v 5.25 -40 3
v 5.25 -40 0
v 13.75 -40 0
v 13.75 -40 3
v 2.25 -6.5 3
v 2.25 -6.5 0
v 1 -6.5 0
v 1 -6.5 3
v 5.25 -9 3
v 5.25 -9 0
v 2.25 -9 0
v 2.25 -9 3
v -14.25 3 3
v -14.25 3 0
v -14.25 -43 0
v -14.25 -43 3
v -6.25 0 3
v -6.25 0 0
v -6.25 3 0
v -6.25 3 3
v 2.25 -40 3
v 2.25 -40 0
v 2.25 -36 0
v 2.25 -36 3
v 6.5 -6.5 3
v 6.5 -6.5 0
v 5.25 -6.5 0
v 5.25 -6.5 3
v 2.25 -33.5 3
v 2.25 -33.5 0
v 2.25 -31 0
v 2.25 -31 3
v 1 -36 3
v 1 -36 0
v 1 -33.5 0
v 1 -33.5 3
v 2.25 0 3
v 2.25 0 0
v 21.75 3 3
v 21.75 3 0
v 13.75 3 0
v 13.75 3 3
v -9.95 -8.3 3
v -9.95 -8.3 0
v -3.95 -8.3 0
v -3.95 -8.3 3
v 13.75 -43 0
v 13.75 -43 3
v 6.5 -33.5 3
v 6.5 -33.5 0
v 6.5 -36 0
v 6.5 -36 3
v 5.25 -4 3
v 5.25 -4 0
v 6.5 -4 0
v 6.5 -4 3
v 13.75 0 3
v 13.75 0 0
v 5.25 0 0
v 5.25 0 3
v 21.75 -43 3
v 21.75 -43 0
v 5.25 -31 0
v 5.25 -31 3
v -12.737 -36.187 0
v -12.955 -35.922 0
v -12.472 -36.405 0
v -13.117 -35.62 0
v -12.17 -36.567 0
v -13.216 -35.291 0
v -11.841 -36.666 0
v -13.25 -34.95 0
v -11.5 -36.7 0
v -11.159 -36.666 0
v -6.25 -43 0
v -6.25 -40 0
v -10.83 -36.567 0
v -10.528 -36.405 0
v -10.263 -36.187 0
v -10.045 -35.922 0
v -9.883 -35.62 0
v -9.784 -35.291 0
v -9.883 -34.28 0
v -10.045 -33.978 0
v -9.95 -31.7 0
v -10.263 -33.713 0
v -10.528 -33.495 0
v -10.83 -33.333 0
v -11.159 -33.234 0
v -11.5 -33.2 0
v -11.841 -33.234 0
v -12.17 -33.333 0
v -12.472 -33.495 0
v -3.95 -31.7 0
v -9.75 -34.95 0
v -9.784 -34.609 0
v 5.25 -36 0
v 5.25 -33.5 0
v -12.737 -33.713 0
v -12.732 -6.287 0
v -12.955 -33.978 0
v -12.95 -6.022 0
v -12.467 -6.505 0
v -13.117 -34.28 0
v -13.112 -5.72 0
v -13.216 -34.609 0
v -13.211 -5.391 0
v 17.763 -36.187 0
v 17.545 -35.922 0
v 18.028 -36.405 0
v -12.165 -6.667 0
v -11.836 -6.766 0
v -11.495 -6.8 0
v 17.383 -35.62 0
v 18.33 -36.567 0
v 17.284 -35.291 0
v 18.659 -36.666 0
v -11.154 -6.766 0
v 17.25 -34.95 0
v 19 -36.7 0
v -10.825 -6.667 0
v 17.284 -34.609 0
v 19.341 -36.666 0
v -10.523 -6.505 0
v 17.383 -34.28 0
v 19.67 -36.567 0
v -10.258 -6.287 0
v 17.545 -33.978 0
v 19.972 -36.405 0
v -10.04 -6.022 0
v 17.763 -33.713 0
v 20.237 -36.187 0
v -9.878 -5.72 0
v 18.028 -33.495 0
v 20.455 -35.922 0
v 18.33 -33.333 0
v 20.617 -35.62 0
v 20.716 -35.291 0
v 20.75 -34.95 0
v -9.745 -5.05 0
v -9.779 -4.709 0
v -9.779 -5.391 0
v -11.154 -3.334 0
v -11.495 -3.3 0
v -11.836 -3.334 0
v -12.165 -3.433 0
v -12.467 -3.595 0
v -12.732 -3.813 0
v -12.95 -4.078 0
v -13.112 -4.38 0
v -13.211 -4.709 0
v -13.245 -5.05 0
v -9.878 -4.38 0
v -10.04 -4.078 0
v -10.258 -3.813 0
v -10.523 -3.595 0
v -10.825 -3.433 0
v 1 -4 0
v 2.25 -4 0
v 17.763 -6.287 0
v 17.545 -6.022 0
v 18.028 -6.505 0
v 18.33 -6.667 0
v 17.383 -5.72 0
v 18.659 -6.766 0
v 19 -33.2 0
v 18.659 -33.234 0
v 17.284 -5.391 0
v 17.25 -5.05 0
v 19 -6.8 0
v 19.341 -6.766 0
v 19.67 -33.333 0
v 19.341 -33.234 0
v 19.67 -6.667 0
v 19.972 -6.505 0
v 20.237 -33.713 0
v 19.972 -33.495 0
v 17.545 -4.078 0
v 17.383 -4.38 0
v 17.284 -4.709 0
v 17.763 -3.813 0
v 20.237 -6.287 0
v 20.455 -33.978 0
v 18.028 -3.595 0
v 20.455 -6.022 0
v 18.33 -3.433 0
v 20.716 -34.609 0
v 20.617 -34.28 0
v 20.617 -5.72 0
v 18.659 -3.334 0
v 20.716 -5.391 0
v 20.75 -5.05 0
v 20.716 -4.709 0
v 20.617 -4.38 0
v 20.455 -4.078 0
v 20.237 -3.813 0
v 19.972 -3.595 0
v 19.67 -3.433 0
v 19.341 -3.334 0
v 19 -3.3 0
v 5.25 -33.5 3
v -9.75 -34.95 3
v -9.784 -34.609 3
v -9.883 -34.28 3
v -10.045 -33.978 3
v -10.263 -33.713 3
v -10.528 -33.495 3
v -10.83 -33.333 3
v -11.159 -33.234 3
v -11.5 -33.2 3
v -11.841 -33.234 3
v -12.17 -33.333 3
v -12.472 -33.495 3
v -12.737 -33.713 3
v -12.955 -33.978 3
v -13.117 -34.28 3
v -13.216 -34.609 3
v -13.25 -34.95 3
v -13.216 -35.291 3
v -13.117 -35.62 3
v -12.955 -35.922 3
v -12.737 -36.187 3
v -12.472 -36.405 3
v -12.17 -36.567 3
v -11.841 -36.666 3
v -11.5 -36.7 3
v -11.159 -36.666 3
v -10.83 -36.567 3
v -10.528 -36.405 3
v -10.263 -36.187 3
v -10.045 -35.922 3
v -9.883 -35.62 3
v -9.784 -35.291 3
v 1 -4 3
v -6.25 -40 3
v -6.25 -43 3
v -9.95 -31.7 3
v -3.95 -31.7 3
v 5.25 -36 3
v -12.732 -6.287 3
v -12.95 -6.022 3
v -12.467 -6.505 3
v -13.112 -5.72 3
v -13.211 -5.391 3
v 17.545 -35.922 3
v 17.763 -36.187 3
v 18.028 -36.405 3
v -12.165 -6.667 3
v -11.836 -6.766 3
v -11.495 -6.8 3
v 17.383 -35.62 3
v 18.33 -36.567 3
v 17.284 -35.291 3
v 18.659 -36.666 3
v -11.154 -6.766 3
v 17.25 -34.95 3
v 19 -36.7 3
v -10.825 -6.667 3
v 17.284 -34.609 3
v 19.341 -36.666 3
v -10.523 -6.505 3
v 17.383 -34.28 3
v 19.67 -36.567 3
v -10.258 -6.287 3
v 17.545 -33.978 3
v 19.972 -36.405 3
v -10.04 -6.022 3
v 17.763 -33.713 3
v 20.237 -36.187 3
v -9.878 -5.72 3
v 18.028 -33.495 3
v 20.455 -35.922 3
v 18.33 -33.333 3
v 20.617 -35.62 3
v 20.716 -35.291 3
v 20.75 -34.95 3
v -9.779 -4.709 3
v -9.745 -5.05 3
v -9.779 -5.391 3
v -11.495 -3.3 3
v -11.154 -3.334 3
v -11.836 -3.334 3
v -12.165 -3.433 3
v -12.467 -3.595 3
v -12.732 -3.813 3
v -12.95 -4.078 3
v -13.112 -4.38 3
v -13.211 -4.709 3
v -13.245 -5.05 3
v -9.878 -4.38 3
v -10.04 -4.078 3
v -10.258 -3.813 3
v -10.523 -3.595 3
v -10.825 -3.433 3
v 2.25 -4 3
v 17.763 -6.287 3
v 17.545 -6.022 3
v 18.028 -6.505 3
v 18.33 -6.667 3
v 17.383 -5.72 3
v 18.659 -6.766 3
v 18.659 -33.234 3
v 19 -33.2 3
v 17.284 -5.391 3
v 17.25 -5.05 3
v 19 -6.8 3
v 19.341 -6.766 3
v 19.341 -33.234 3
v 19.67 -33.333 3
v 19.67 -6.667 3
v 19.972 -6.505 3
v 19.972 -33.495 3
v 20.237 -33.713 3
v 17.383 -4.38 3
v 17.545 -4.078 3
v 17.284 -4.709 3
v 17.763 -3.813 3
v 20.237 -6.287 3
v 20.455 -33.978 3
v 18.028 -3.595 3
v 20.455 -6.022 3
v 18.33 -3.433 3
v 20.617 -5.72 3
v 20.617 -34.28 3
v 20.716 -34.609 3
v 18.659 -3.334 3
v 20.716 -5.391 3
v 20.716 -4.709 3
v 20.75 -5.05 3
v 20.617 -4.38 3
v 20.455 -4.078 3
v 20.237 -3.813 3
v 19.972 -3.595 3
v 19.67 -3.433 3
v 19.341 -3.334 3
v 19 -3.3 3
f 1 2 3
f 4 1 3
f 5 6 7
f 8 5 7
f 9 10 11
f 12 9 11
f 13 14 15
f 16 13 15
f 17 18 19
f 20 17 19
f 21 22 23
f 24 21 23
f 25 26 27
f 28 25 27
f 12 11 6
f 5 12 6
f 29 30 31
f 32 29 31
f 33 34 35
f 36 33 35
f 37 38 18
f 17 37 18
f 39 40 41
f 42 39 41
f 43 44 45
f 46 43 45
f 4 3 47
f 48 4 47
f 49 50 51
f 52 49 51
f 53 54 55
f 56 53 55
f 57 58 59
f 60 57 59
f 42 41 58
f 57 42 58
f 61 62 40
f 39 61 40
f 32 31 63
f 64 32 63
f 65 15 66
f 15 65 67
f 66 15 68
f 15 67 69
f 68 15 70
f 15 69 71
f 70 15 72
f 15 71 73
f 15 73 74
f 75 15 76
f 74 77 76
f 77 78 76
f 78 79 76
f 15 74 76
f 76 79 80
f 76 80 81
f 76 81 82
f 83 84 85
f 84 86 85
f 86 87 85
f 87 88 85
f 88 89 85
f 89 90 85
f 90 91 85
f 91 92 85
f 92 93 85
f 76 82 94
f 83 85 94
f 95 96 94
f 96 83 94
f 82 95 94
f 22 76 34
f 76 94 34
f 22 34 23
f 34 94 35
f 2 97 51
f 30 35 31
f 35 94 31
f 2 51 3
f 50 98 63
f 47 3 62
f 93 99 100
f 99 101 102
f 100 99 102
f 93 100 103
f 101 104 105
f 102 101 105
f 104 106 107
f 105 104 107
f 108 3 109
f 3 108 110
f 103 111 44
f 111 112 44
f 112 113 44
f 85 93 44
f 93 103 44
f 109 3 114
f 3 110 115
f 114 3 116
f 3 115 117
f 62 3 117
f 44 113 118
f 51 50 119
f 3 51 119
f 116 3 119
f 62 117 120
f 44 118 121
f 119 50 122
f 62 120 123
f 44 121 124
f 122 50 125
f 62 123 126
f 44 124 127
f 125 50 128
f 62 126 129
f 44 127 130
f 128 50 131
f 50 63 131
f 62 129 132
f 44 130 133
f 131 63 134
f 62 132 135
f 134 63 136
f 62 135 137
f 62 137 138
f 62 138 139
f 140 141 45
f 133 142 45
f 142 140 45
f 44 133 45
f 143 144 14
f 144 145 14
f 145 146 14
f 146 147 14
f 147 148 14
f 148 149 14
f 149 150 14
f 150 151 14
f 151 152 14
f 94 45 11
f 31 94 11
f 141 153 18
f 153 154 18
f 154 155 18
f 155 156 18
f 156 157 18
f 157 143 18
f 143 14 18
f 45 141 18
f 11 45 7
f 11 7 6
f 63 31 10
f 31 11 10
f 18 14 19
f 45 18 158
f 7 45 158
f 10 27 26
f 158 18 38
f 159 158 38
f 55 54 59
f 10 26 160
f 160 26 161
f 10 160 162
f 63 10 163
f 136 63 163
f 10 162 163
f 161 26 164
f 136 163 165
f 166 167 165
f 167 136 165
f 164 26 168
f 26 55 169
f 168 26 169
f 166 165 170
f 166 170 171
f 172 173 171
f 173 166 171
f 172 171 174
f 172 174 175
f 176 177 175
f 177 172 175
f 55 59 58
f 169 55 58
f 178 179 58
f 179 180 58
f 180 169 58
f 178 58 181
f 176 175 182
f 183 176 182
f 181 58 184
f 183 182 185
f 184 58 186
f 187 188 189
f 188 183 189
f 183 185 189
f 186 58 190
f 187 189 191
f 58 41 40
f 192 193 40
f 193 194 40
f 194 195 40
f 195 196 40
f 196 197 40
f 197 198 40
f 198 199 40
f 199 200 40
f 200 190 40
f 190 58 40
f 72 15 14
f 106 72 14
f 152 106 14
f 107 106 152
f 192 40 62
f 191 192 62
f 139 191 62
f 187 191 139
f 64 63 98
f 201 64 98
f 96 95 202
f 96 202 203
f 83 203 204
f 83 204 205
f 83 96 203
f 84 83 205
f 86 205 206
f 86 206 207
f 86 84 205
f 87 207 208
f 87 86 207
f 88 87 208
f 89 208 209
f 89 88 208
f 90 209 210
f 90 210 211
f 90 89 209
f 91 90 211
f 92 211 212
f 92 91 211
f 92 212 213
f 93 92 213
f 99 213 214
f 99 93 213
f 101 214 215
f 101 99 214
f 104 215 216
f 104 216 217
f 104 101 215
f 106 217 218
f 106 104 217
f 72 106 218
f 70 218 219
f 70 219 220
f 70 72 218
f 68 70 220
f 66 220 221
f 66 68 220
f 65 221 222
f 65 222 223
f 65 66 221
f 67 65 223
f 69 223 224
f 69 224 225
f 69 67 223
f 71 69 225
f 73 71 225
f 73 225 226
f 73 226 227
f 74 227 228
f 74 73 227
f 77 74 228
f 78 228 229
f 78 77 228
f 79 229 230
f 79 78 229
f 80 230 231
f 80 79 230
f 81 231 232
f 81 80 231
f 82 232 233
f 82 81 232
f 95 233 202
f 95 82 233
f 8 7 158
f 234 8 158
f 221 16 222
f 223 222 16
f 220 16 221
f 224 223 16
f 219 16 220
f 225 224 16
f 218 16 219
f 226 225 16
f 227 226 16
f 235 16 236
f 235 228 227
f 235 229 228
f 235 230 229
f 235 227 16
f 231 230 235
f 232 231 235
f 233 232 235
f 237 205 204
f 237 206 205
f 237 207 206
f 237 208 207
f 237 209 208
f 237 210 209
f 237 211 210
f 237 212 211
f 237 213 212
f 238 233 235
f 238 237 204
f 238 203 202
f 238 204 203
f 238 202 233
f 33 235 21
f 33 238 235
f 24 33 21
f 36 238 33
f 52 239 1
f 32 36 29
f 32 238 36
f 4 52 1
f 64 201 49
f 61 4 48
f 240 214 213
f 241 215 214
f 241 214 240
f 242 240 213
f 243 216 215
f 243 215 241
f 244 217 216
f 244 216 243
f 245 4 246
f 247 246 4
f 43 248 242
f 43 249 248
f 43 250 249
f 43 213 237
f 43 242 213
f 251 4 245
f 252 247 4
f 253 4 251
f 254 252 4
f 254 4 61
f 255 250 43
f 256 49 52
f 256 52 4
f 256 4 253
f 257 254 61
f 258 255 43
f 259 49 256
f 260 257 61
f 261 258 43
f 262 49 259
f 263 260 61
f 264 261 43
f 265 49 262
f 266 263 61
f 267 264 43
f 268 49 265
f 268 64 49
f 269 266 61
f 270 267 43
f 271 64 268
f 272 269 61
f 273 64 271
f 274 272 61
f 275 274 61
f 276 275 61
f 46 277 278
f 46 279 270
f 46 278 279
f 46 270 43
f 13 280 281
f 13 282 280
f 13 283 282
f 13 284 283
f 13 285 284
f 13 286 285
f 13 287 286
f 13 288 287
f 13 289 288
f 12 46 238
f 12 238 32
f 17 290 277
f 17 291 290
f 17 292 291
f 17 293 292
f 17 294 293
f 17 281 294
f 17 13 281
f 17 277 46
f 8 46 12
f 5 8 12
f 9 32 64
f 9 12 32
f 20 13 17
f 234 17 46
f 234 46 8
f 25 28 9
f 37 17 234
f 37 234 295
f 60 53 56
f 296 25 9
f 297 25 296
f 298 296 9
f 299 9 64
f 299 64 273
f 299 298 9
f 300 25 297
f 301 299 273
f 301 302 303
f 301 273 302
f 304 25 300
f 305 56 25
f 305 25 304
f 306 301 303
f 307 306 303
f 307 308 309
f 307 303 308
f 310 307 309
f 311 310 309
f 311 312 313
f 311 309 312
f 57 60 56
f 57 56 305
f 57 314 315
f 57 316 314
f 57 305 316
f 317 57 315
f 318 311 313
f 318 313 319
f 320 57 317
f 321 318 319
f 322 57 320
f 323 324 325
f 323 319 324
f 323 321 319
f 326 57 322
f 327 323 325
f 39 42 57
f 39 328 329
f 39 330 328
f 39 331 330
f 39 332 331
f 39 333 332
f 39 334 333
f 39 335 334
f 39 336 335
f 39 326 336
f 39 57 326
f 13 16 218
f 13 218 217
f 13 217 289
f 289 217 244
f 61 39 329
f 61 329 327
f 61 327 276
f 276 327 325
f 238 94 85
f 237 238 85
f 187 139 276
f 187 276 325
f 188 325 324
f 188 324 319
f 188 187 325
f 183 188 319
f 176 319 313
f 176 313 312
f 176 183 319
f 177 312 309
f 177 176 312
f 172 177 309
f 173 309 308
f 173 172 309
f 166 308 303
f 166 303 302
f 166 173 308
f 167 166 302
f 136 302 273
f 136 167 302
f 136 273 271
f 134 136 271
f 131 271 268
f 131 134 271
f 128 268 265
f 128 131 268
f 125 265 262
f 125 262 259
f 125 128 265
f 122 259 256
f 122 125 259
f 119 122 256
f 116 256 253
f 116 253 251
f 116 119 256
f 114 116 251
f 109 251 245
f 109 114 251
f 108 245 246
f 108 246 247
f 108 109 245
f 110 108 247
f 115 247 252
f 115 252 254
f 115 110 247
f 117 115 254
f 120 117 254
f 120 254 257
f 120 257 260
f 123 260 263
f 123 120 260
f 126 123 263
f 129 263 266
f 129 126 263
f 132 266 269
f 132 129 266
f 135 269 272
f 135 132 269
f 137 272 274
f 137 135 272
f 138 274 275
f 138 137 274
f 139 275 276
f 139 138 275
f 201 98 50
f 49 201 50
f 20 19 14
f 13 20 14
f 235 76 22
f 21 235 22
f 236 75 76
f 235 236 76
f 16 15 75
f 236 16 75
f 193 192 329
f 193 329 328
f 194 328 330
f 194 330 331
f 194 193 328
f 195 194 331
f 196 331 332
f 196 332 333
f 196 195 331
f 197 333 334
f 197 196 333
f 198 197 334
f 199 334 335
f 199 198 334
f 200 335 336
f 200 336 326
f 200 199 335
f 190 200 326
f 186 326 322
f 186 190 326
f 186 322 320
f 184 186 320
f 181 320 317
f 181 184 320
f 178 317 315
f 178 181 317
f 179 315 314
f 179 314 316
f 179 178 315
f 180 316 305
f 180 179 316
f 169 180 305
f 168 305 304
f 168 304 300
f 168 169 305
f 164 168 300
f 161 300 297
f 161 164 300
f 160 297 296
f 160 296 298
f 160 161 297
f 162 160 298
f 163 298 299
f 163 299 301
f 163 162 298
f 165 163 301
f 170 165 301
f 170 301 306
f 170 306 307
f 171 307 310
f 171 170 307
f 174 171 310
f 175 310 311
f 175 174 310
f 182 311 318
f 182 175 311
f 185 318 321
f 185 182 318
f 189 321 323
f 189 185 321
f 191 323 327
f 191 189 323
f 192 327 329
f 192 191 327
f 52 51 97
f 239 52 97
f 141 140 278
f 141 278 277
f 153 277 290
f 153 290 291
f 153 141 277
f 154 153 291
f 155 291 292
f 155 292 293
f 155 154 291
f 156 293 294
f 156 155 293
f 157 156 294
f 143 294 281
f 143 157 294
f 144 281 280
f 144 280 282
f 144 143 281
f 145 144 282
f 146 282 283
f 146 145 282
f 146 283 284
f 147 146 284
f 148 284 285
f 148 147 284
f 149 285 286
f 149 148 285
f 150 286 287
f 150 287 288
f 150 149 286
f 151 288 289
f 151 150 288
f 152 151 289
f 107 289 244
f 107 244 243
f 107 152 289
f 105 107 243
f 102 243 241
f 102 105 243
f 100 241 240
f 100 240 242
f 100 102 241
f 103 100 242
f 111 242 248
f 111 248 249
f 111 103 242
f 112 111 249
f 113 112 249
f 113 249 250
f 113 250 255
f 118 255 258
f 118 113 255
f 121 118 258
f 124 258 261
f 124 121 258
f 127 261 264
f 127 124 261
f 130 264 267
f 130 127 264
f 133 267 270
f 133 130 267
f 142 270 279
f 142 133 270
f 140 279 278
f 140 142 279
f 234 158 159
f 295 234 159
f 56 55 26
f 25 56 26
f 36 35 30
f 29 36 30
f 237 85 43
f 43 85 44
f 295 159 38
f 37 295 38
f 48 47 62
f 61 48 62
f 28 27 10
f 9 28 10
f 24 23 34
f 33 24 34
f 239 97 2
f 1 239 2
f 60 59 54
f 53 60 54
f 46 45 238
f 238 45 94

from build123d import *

# Parameters (mm, degrees)
ESBO_O1_R                = 1.75
RESSALTO_EXTRUS_O1_DEPTH = 3


with BuildPart() as part:
    # Esboço1 → Ressalto-extrusão1 (new body)
    with BuildSketch(Plane.XY):
        Polygon((2.25, 0), (-6.25, 0), (-6.25, 2), (-6.25, 3), (-14.25, 3), (-14.25, 2), (-14.25, -42), (-14.25, -43), (-6.25, -43), (-6.25, -42), (-6.25, -40), (2.25, -40), (2.25, -36), (1, -36), (1, -33.5), (2.25, -33.5), (2.25, -31), (5.25, -31), (5.25, -33.5), (6.5, -33.5), (6.5, -36), (5.25, -36), (5.25, -40), (13.75, -40), (13.75, -42), (13.75, -43), (21.75, -43), (21.75, -42), (21.75, 2), (21.75, 3), (13.75, 3), (13.75, 2), (13.75, 0), (5.25, 0), (5.25, -4), (6.5, -4), (6.5, -6.5), (5.25, -6.5), (5.25, -9), (2.25, -9), (2.25, -6.5), (1, -6.5), (1, -4), (2.25, -4), align=None)
        with Locations((19, -5.05)):
            Circle(ESBO_O1_R, mode=Mode.SUBTRACT)
        with Locations((-11.495010855, -5.05)):
            Circle(ESBO_O1_R, mode=Mode.SUBTRACT)
        with Locations((19, -34.95)):
            Circle(ESBO_O1_R, mode=Mode.SUBTRACT)
        with Locations((-11.5, -34.95)):
            Circle(ESBO_O1_R, mode=Mode.SUBTRACT)
        Polygon((-9.95, -8.8), (-9.95, -31.2), (-9.95, -31.7), (-6.95, -31.7), (-3.95, -31.7), (-3.95, -31.2), (-3.95, -8.8), (-3.95, -8.3), (-6.95, -8.3), (-9.95, -8.3), align=None, mode=Mode.SUBTRACT)
    extrude(amount=RESSALTO_EXTRUS_O1_DEPTH)


solid = part.part
